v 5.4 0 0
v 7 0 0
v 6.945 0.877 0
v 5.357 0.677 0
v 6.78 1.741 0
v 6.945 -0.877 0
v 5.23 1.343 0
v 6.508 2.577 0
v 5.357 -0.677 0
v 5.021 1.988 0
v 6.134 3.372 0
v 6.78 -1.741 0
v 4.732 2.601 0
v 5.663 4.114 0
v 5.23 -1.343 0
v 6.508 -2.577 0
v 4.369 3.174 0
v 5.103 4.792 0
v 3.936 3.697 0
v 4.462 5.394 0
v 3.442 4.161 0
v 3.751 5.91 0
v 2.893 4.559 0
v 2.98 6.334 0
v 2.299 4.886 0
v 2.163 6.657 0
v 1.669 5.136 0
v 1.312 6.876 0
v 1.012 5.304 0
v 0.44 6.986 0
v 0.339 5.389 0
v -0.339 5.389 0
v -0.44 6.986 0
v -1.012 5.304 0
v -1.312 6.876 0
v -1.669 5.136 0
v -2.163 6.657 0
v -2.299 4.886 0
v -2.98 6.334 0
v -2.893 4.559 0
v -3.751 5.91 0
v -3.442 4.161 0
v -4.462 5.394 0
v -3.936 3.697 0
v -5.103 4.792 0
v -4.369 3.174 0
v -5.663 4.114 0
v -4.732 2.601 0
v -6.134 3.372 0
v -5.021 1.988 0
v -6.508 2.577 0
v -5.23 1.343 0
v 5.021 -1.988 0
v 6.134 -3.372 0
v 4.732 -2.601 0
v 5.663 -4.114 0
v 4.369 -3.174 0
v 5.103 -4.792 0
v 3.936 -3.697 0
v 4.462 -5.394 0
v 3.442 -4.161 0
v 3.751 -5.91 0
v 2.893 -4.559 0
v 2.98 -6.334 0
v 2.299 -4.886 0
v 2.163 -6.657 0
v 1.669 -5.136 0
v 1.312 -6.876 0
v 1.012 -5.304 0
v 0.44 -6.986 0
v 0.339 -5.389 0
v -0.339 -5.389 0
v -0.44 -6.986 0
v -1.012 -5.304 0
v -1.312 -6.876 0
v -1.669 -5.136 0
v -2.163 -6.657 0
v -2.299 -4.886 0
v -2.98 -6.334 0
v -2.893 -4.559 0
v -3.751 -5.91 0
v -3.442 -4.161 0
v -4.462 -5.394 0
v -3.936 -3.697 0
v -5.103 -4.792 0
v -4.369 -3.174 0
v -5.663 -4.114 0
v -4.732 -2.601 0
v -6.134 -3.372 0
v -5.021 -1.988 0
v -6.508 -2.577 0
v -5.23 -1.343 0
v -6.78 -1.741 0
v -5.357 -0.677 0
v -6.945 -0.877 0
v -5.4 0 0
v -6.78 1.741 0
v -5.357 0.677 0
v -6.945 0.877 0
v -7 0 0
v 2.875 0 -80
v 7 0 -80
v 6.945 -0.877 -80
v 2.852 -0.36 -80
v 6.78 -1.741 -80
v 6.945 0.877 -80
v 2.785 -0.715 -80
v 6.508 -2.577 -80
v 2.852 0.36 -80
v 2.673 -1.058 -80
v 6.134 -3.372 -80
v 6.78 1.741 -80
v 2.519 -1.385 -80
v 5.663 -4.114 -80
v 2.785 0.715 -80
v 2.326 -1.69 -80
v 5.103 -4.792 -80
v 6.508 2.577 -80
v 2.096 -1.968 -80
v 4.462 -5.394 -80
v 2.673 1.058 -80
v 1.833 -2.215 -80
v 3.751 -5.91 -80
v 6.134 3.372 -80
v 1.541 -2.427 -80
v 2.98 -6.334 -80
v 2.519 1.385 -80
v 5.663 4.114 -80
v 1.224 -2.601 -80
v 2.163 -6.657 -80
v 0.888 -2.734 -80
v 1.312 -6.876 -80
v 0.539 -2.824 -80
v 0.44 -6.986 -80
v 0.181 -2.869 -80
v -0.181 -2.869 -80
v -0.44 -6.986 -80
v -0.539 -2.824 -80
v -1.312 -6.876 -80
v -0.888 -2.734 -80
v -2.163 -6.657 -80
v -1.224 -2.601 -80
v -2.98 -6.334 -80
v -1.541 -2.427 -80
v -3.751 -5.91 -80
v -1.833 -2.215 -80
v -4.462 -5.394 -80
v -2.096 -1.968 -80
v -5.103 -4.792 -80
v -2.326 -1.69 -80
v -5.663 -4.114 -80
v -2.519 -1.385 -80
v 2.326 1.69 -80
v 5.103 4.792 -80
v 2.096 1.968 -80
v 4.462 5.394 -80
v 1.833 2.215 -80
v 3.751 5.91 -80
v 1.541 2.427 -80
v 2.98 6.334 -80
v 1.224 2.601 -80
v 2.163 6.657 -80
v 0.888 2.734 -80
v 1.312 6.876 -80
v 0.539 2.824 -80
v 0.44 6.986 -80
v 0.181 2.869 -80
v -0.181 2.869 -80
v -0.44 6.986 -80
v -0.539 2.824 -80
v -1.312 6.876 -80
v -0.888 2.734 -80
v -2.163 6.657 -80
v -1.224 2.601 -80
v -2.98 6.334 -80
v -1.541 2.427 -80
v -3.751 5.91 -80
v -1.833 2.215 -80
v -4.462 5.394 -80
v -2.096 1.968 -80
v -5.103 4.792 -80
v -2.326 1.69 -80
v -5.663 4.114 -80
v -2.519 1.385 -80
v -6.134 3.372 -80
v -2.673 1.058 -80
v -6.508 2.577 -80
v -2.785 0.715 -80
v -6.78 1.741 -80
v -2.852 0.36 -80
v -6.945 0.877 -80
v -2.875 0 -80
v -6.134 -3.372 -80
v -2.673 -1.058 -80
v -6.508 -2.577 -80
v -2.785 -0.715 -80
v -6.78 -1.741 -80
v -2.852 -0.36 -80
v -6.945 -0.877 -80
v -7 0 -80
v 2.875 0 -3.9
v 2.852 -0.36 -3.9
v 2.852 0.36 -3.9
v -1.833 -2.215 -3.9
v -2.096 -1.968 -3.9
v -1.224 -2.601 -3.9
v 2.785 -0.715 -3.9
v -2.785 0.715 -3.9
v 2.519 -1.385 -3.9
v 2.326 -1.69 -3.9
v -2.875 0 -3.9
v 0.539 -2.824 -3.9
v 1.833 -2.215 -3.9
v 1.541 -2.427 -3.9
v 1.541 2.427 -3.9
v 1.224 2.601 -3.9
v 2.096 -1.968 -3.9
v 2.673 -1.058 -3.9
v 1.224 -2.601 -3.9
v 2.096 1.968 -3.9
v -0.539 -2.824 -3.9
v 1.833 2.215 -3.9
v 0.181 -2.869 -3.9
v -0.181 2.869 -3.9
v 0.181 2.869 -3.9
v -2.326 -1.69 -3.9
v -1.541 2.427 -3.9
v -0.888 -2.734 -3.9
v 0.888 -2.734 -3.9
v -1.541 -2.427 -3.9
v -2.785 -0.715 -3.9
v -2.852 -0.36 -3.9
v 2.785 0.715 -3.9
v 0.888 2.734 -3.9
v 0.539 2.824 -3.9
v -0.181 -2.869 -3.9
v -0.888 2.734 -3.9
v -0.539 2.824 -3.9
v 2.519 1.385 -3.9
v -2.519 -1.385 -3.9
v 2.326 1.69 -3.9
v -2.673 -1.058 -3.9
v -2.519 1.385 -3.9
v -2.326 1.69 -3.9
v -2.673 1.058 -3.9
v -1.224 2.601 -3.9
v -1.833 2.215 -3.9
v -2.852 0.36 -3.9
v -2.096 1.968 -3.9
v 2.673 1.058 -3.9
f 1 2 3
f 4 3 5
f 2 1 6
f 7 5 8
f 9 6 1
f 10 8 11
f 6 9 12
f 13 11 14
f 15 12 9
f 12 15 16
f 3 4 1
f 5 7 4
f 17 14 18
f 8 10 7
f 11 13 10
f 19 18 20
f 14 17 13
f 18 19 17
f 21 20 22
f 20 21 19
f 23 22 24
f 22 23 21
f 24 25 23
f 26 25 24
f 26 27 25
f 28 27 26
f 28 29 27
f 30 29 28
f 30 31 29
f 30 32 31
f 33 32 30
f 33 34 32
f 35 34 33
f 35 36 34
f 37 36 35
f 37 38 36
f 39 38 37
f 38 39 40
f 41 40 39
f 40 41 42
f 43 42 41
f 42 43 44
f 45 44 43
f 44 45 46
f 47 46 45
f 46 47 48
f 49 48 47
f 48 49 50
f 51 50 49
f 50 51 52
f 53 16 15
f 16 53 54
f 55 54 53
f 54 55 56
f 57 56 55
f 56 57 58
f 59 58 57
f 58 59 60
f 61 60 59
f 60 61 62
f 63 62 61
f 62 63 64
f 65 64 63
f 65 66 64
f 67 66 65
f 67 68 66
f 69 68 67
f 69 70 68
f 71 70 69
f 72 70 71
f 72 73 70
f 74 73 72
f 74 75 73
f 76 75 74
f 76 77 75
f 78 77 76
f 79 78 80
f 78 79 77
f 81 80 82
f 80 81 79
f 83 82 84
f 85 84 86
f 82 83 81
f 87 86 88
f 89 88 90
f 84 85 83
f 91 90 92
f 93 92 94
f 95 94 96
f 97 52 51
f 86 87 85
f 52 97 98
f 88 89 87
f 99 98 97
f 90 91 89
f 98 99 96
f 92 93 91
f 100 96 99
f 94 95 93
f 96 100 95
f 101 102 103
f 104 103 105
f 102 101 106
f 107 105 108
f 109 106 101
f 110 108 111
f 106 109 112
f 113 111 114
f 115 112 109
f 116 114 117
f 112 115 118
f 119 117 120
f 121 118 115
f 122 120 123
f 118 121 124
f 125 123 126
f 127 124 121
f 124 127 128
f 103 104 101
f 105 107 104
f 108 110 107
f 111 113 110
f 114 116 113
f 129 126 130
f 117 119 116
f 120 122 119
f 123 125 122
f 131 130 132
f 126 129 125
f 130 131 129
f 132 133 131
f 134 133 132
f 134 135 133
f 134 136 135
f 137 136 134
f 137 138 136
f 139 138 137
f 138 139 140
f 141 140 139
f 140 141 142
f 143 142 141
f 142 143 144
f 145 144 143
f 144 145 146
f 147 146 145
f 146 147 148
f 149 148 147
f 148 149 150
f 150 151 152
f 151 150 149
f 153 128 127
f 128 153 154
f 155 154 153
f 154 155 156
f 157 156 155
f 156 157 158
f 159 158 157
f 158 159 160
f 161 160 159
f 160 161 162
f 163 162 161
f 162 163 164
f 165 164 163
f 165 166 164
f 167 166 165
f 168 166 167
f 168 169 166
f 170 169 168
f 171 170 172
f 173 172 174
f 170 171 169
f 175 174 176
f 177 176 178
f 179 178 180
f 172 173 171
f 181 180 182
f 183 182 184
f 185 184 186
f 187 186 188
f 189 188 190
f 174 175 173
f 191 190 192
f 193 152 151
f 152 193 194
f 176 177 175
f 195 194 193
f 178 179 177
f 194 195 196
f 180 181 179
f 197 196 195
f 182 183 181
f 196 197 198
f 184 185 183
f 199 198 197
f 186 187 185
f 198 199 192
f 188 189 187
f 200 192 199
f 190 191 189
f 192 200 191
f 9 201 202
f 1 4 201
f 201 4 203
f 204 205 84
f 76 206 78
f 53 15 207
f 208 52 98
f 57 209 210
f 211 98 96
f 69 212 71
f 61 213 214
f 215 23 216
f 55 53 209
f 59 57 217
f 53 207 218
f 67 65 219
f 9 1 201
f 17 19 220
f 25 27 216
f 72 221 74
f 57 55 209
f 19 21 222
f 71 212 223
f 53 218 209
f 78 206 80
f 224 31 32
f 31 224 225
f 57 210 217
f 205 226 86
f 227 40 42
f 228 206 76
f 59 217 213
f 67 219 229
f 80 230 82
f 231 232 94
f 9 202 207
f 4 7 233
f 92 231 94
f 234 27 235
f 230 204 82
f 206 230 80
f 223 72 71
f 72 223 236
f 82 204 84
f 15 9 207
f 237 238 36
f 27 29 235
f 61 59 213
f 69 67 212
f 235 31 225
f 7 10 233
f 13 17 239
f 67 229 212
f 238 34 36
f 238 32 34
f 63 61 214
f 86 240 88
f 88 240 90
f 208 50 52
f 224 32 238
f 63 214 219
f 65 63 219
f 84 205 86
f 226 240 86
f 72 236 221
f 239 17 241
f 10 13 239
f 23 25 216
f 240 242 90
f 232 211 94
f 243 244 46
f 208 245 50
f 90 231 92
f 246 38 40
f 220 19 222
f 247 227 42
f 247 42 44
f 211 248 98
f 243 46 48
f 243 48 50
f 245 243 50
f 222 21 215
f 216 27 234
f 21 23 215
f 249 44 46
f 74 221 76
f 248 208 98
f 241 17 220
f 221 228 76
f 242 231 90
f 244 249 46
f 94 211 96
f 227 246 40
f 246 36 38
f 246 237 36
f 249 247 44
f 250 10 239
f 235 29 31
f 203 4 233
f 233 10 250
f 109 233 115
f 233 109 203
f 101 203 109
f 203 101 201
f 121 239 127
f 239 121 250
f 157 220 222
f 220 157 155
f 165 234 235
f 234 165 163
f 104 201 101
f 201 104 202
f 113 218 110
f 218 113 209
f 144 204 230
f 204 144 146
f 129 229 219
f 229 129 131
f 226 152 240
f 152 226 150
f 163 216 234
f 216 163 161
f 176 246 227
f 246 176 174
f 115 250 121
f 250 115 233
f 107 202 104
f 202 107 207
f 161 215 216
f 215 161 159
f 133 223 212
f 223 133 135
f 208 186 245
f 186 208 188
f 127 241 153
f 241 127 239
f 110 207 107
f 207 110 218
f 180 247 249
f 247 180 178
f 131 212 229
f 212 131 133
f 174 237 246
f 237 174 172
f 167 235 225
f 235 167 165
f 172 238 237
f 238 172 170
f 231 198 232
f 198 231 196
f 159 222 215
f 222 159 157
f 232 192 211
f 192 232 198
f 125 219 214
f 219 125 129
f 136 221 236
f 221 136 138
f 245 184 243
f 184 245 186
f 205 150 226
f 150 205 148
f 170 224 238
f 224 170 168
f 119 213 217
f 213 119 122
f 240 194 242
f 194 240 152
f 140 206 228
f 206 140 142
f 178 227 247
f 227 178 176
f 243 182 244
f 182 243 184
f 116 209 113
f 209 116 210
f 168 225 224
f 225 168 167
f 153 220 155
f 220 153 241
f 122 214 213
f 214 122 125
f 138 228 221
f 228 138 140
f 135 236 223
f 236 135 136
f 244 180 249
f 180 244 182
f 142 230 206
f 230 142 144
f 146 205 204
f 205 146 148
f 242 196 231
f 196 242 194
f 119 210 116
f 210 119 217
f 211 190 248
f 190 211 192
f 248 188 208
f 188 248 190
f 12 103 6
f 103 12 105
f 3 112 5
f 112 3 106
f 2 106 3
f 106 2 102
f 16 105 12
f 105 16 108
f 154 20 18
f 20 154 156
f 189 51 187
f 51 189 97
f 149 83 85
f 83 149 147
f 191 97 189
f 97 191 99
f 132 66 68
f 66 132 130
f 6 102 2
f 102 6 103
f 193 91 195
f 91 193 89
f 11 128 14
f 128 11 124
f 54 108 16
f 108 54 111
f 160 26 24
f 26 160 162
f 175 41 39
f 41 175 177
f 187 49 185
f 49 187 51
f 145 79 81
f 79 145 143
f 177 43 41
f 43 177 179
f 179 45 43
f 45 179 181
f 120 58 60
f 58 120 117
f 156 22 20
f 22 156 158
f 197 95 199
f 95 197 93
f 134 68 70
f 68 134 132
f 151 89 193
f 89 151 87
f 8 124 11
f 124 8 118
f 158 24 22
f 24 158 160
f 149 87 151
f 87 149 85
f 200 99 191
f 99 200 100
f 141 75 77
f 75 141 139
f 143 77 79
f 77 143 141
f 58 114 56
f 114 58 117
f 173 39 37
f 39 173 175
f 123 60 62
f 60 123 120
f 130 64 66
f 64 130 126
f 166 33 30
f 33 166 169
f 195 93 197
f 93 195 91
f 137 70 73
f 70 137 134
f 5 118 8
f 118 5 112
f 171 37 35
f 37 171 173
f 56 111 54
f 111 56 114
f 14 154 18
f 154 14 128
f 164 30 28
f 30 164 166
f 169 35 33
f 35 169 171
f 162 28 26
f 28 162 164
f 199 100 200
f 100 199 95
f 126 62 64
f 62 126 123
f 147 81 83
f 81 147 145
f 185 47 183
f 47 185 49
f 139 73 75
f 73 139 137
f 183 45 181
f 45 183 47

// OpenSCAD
$fn = 50;


difference() {
	union() {
		translate(v = [0, 0, -80.0000000000]) {
			cylinder(h = 80, r = 7.0000000000);
		}
		cylinder(h = 0, r = 10.0000000000);
	}
	union() {
		translate(v = [0, 0, 0]) {
			rotate(a = [0, 0, 0]) {
				difference() {
					union() {
						#translate(v = [0, 0, -80.0000000000]) {
							cylinder(h = 80, r = 2.6000000000);
						}
						#translate(v = [0, 0, -3.9000000000]) {
							cylinder(h = 3.9000000000, r = 7.0000000000, r1 = 2.8750000000, r2 = 5.4000000000);
						}
						#translate(v = [0, 0, -80.0000000000]) {
							cylinder(h = 80, r = 2.8750000000);
						}
						#translate(v = [0, 0, -80.0000000000]) {
							cylinder(h = 80, r = 2.6000000000);
						}
					}
					union();
				}
			}
		}
	}
}
